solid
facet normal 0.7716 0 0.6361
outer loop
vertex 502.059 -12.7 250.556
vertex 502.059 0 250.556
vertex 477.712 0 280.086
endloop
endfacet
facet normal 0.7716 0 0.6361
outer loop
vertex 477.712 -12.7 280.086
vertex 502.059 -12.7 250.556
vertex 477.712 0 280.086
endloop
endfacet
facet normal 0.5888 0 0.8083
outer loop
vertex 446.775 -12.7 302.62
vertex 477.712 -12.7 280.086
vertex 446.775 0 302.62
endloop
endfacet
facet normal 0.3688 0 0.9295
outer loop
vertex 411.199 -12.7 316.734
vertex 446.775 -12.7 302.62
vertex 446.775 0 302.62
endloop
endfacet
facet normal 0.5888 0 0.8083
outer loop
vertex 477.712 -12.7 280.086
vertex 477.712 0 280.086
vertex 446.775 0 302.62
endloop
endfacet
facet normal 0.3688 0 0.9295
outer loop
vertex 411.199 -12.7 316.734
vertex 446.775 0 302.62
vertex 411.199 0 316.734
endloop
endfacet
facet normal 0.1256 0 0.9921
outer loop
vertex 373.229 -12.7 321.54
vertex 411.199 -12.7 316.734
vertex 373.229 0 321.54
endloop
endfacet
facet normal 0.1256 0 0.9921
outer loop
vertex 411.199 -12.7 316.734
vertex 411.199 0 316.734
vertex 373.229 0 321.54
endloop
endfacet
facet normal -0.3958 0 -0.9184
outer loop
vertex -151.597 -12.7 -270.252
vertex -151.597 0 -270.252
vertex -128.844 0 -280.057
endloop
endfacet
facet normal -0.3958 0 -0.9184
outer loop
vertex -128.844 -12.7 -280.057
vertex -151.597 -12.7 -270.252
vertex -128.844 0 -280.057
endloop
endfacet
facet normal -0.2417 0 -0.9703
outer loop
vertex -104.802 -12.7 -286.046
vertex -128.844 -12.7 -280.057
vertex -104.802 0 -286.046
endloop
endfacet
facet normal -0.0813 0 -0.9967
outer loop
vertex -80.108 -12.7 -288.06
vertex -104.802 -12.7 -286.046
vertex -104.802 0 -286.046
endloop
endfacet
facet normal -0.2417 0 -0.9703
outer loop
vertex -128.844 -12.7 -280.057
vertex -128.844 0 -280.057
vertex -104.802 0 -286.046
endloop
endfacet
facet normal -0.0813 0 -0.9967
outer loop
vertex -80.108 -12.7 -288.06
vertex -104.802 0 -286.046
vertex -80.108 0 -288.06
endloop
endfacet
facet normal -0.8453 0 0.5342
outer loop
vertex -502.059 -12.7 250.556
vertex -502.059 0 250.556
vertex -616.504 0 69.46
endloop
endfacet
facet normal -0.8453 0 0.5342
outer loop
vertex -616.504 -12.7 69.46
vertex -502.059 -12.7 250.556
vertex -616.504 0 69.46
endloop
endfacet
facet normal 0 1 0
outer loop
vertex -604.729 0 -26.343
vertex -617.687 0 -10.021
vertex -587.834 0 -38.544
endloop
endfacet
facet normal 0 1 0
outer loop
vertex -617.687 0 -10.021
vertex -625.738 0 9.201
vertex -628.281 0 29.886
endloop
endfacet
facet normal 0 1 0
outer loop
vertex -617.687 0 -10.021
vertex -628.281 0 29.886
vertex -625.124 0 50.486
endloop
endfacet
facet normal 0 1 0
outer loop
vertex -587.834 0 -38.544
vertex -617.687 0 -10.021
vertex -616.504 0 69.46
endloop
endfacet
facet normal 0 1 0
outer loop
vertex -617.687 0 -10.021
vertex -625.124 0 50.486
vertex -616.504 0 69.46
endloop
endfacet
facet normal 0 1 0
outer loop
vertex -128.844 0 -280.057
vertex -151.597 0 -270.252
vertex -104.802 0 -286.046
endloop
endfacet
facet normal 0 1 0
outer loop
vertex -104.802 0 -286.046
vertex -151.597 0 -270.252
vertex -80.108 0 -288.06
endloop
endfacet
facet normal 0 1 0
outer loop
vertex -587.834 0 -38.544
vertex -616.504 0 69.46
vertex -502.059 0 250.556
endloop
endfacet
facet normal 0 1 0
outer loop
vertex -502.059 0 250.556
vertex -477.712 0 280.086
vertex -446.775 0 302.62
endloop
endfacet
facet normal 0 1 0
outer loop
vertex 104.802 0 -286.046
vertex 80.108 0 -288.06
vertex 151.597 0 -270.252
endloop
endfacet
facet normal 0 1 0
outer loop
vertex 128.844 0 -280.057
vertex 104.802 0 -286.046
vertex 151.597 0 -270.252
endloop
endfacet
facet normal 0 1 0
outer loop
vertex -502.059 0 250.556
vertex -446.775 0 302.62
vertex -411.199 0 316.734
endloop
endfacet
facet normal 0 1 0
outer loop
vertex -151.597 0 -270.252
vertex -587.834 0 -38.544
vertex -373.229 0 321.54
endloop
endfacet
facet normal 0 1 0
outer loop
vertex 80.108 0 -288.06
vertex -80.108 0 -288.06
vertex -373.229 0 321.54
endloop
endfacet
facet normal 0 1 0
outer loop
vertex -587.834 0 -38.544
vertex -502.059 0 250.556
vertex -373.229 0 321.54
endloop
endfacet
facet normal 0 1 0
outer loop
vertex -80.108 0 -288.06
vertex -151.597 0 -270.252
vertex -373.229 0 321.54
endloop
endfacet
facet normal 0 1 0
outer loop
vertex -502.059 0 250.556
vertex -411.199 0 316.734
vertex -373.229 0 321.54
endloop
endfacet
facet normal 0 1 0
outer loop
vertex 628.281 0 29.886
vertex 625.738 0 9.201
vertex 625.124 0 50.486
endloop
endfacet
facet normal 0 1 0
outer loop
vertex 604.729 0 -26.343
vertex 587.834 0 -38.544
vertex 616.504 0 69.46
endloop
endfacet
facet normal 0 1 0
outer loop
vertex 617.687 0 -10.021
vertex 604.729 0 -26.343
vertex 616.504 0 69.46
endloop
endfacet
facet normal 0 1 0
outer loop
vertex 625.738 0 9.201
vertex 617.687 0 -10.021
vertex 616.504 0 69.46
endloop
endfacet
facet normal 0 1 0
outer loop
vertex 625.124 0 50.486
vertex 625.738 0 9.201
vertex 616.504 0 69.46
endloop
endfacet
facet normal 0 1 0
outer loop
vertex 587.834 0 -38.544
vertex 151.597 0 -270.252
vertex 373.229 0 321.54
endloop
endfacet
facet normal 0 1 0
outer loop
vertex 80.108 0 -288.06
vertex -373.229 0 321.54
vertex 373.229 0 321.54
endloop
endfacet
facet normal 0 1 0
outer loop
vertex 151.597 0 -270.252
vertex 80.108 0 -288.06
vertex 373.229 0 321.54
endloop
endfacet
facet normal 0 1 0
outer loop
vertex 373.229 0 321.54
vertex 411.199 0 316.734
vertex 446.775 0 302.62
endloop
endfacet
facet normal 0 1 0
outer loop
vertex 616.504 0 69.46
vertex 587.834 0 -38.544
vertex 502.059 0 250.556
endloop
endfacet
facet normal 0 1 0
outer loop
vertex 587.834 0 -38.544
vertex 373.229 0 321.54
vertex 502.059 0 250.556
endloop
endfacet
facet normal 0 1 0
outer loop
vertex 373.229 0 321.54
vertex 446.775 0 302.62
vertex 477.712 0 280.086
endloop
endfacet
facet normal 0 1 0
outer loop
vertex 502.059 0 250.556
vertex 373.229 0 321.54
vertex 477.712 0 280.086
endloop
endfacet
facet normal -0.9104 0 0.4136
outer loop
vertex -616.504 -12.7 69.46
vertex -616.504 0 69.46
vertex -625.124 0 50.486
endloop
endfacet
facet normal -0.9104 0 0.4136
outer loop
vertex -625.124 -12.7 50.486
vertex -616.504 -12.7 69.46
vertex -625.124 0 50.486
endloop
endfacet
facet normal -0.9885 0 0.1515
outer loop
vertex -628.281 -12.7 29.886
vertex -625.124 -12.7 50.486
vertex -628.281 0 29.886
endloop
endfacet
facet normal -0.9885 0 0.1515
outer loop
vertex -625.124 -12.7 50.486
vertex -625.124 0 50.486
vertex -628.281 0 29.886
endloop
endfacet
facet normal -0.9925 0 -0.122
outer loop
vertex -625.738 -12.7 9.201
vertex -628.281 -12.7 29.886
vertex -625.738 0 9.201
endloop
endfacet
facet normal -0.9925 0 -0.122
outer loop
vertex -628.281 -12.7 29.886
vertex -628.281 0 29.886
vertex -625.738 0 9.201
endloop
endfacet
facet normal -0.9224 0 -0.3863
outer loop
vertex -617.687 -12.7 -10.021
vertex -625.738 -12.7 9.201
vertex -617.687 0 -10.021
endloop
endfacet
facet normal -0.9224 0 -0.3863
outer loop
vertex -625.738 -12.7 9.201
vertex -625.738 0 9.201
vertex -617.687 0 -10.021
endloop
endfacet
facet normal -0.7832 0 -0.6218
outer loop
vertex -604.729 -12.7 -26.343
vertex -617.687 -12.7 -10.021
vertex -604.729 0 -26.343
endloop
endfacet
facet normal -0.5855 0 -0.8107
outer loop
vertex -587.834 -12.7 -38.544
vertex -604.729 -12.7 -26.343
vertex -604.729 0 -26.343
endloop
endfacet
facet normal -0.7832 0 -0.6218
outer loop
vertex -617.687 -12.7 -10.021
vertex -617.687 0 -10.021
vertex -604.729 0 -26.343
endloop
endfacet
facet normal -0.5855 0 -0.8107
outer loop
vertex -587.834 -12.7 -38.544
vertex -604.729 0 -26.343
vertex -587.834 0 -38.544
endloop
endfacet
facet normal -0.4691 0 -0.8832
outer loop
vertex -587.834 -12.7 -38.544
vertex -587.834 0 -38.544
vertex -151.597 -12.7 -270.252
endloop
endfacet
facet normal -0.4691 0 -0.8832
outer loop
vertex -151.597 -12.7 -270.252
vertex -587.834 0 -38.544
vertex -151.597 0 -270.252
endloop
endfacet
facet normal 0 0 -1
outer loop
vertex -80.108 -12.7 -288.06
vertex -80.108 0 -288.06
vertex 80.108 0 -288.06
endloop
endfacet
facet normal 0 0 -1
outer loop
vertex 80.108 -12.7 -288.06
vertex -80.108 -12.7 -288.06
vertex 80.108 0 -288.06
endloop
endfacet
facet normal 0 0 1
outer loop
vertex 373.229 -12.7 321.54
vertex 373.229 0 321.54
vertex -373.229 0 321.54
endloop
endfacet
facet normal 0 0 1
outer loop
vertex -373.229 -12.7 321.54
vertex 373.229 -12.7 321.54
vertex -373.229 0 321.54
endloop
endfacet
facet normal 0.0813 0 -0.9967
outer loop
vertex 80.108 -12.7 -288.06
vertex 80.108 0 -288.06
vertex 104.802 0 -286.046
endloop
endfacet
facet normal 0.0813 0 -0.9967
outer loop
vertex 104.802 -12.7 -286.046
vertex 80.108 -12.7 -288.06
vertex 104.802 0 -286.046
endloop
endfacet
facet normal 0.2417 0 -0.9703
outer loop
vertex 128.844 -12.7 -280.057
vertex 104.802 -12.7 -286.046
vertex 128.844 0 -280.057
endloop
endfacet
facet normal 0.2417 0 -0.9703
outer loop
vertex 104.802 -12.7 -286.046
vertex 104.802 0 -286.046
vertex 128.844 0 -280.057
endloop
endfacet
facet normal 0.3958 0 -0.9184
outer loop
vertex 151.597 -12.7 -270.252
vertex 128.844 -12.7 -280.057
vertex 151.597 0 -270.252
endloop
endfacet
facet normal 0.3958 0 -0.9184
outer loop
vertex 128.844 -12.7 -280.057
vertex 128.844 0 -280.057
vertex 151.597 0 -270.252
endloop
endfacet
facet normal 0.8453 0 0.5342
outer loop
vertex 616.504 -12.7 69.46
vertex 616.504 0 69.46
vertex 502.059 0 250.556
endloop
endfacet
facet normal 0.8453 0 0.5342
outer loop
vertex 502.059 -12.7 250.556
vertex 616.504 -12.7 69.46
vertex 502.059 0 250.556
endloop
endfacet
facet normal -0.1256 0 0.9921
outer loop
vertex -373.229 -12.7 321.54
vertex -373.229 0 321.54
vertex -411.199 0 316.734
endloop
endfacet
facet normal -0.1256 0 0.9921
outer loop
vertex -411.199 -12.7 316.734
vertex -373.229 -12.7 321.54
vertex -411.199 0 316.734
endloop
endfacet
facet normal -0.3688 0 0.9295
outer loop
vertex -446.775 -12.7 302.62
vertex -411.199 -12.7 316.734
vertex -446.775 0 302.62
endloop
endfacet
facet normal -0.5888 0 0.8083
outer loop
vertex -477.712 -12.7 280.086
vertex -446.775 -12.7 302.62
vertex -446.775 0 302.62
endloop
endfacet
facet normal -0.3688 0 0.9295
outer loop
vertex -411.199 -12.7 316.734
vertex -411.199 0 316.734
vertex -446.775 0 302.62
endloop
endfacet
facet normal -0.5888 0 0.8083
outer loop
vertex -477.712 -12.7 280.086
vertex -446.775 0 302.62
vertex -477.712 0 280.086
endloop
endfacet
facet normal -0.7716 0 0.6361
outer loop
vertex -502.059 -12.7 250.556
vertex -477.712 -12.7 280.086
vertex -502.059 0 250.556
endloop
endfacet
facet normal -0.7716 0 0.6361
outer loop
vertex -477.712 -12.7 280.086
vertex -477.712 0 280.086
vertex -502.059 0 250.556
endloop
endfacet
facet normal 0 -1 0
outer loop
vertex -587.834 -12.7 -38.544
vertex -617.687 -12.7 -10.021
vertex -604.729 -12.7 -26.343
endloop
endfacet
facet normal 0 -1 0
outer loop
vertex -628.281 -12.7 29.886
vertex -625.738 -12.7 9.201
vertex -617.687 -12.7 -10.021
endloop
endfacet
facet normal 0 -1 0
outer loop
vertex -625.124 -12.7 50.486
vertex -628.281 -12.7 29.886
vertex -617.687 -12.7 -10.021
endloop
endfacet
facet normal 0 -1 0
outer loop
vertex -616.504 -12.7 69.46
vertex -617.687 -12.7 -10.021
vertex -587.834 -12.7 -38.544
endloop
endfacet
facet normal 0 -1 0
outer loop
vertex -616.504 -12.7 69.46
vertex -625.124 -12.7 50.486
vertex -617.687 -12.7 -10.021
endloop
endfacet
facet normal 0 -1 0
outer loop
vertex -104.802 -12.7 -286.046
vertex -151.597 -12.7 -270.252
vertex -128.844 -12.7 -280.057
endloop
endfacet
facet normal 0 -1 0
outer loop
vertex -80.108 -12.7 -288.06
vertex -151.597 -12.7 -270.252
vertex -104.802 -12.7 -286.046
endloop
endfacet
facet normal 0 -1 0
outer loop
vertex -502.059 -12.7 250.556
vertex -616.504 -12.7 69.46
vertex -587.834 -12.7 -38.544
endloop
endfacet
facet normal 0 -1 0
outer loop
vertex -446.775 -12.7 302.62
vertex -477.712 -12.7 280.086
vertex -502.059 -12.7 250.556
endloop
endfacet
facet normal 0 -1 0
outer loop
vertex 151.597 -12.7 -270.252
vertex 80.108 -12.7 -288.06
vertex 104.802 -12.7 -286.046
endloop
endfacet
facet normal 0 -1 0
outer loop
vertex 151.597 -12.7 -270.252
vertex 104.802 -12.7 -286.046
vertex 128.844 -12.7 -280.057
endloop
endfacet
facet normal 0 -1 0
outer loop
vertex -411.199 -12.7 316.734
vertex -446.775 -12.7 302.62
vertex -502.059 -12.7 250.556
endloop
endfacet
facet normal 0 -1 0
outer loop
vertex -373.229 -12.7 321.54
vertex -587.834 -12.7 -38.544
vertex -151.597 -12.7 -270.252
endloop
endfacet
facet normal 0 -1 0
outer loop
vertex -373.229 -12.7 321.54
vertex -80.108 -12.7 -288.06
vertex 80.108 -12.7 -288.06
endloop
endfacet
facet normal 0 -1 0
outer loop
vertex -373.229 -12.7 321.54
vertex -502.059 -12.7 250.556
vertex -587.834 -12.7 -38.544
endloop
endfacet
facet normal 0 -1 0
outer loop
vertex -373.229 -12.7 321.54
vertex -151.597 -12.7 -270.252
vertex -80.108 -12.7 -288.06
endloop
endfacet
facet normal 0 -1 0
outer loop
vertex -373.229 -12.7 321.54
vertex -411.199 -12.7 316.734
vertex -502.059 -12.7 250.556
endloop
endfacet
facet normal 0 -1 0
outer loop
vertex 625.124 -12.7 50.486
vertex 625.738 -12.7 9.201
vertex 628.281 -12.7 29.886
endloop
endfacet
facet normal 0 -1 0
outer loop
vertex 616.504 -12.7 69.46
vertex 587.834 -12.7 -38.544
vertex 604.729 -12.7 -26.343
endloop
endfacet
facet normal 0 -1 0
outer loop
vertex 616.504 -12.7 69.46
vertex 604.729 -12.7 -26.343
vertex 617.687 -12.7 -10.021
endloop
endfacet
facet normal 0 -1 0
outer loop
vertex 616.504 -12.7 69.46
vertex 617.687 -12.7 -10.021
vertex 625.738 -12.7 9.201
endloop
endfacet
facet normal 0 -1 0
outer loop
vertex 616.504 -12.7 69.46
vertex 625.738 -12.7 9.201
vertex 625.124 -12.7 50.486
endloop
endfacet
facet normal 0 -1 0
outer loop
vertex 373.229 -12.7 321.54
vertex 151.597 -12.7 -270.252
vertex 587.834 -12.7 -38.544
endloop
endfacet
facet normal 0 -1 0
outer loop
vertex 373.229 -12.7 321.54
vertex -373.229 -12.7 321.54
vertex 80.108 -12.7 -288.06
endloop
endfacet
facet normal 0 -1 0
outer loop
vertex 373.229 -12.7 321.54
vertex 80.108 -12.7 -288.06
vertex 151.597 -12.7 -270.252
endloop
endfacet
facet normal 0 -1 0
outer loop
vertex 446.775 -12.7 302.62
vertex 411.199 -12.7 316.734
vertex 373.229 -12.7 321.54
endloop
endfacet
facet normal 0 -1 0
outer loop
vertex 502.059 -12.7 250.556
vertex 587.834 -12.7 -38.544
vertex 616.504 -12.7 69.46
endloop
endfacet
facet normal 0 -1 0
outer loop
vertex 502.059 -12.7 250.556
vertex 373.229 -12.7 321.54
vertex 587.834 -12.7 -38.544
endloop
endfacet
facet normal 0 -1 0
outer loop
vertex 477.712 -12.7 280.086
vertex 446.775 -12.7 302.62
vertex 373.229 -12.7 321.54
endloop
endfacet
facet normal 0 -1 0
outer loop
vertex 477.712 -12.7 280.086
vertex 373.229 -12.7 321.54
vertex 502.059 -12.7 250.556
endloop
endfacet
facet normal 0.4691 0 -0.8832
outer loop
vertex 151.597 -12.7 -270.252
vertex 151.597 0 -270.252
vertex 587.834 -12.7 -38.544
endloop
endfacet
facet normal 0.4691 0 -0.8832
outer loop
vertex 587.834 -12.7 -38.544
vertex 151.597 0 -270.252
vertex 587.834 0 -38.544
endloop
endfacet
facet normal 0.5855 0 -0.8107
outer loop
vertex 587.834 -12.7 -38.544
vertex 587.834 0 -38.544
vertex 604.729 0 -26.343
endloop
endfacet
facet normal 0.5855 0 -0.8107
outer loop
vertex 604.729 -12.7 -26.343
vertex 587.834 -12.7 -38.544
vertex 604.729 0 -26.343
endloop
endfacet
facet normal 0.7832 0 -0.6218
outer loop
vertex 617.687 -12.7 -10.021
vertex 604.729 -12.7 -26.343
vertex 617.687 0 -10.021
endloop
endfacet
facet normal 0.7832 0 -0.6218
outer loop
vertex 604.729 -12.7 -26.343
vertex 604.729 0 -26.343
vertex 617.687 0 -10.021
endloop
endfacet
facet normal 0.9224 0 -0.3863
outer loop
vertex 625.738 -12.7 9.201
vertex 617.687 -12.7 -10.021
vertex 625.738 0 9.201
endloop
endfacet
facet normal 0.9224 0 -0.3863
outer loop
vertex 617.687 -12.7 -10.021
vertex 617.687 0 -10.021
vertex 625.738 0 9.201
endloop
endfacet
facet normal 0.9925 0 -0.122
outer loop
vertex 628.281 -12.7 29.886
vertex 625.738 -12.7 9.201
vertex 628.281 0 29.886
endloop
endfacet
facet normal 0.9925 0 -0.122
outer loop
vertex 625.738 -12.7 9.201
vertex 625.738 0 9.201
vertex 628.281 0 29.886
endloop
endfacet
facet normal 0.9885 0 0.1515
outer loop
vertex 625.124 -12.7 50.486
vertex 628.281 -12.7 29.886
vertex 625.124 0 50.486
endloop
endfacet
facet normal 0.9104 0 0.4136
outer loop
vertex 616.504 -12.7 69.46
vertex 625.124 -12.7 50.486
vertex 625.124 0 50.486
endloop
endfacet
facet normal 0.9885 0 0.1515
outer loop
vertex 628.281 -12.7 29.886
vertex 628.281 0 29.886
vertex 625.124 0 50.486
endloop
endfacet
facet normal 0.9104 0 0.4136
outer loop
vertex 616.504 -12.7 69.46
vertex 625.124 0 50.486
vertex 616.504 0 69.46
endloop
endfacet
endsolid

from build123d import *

# Parameters (mm, degrees)
F1_DEPTH = 12.7


with BuildPart() as f1:
    # F0 (on Front) → F1 (new body)
    with BuildSketch(Plane.XZ):
        with BuildLine():
            Line((373.228805, 321.540359), (0, 321.540359))
            Line((0, 321.540359), (-373.228805, 321.540359))
            ThreePointArc((-373.228805, 321.540359), (-446.77487, 302.619706), (-502.059262, 250.555796))
            Line((-502.059262, 250.555796), (-616.504222, 69.459962))
            ThreePointArc((-616.504222, 69.459962), (-625.738174, 9.20133), (-587.833517, -38.543886))
            Line((-587.833517, -38.543886), (-151.597384, -270.251901))
            ThreePointArc((-151.597384, -270.251901), (-116.945137, -283.540709), (-80.108337, -288.059641))
            Line((-80.108337, -288.059641), (80.108337, -288.059641))
            ThreePointArc((80.108337, -288.059641), (116.945137, -283.540709), (151.597384, -270.251901))
            Line((151.597384, -270.251901), (587.833517, -38.543886))
            ThreePointArc((587.833517, -38.543886), (625.738174, 9.20133), (616.504222, 69.459962))
            Line((616.504222, 69.459962), (502.059262, 250.555796))
            ThreePointArc((502.059262, 250.555796), (446.77487, 302.619706), (373.228805, 321.540359))
        make_face()
    extrude(amount=F1_DEPTH)


solid = f1.part
